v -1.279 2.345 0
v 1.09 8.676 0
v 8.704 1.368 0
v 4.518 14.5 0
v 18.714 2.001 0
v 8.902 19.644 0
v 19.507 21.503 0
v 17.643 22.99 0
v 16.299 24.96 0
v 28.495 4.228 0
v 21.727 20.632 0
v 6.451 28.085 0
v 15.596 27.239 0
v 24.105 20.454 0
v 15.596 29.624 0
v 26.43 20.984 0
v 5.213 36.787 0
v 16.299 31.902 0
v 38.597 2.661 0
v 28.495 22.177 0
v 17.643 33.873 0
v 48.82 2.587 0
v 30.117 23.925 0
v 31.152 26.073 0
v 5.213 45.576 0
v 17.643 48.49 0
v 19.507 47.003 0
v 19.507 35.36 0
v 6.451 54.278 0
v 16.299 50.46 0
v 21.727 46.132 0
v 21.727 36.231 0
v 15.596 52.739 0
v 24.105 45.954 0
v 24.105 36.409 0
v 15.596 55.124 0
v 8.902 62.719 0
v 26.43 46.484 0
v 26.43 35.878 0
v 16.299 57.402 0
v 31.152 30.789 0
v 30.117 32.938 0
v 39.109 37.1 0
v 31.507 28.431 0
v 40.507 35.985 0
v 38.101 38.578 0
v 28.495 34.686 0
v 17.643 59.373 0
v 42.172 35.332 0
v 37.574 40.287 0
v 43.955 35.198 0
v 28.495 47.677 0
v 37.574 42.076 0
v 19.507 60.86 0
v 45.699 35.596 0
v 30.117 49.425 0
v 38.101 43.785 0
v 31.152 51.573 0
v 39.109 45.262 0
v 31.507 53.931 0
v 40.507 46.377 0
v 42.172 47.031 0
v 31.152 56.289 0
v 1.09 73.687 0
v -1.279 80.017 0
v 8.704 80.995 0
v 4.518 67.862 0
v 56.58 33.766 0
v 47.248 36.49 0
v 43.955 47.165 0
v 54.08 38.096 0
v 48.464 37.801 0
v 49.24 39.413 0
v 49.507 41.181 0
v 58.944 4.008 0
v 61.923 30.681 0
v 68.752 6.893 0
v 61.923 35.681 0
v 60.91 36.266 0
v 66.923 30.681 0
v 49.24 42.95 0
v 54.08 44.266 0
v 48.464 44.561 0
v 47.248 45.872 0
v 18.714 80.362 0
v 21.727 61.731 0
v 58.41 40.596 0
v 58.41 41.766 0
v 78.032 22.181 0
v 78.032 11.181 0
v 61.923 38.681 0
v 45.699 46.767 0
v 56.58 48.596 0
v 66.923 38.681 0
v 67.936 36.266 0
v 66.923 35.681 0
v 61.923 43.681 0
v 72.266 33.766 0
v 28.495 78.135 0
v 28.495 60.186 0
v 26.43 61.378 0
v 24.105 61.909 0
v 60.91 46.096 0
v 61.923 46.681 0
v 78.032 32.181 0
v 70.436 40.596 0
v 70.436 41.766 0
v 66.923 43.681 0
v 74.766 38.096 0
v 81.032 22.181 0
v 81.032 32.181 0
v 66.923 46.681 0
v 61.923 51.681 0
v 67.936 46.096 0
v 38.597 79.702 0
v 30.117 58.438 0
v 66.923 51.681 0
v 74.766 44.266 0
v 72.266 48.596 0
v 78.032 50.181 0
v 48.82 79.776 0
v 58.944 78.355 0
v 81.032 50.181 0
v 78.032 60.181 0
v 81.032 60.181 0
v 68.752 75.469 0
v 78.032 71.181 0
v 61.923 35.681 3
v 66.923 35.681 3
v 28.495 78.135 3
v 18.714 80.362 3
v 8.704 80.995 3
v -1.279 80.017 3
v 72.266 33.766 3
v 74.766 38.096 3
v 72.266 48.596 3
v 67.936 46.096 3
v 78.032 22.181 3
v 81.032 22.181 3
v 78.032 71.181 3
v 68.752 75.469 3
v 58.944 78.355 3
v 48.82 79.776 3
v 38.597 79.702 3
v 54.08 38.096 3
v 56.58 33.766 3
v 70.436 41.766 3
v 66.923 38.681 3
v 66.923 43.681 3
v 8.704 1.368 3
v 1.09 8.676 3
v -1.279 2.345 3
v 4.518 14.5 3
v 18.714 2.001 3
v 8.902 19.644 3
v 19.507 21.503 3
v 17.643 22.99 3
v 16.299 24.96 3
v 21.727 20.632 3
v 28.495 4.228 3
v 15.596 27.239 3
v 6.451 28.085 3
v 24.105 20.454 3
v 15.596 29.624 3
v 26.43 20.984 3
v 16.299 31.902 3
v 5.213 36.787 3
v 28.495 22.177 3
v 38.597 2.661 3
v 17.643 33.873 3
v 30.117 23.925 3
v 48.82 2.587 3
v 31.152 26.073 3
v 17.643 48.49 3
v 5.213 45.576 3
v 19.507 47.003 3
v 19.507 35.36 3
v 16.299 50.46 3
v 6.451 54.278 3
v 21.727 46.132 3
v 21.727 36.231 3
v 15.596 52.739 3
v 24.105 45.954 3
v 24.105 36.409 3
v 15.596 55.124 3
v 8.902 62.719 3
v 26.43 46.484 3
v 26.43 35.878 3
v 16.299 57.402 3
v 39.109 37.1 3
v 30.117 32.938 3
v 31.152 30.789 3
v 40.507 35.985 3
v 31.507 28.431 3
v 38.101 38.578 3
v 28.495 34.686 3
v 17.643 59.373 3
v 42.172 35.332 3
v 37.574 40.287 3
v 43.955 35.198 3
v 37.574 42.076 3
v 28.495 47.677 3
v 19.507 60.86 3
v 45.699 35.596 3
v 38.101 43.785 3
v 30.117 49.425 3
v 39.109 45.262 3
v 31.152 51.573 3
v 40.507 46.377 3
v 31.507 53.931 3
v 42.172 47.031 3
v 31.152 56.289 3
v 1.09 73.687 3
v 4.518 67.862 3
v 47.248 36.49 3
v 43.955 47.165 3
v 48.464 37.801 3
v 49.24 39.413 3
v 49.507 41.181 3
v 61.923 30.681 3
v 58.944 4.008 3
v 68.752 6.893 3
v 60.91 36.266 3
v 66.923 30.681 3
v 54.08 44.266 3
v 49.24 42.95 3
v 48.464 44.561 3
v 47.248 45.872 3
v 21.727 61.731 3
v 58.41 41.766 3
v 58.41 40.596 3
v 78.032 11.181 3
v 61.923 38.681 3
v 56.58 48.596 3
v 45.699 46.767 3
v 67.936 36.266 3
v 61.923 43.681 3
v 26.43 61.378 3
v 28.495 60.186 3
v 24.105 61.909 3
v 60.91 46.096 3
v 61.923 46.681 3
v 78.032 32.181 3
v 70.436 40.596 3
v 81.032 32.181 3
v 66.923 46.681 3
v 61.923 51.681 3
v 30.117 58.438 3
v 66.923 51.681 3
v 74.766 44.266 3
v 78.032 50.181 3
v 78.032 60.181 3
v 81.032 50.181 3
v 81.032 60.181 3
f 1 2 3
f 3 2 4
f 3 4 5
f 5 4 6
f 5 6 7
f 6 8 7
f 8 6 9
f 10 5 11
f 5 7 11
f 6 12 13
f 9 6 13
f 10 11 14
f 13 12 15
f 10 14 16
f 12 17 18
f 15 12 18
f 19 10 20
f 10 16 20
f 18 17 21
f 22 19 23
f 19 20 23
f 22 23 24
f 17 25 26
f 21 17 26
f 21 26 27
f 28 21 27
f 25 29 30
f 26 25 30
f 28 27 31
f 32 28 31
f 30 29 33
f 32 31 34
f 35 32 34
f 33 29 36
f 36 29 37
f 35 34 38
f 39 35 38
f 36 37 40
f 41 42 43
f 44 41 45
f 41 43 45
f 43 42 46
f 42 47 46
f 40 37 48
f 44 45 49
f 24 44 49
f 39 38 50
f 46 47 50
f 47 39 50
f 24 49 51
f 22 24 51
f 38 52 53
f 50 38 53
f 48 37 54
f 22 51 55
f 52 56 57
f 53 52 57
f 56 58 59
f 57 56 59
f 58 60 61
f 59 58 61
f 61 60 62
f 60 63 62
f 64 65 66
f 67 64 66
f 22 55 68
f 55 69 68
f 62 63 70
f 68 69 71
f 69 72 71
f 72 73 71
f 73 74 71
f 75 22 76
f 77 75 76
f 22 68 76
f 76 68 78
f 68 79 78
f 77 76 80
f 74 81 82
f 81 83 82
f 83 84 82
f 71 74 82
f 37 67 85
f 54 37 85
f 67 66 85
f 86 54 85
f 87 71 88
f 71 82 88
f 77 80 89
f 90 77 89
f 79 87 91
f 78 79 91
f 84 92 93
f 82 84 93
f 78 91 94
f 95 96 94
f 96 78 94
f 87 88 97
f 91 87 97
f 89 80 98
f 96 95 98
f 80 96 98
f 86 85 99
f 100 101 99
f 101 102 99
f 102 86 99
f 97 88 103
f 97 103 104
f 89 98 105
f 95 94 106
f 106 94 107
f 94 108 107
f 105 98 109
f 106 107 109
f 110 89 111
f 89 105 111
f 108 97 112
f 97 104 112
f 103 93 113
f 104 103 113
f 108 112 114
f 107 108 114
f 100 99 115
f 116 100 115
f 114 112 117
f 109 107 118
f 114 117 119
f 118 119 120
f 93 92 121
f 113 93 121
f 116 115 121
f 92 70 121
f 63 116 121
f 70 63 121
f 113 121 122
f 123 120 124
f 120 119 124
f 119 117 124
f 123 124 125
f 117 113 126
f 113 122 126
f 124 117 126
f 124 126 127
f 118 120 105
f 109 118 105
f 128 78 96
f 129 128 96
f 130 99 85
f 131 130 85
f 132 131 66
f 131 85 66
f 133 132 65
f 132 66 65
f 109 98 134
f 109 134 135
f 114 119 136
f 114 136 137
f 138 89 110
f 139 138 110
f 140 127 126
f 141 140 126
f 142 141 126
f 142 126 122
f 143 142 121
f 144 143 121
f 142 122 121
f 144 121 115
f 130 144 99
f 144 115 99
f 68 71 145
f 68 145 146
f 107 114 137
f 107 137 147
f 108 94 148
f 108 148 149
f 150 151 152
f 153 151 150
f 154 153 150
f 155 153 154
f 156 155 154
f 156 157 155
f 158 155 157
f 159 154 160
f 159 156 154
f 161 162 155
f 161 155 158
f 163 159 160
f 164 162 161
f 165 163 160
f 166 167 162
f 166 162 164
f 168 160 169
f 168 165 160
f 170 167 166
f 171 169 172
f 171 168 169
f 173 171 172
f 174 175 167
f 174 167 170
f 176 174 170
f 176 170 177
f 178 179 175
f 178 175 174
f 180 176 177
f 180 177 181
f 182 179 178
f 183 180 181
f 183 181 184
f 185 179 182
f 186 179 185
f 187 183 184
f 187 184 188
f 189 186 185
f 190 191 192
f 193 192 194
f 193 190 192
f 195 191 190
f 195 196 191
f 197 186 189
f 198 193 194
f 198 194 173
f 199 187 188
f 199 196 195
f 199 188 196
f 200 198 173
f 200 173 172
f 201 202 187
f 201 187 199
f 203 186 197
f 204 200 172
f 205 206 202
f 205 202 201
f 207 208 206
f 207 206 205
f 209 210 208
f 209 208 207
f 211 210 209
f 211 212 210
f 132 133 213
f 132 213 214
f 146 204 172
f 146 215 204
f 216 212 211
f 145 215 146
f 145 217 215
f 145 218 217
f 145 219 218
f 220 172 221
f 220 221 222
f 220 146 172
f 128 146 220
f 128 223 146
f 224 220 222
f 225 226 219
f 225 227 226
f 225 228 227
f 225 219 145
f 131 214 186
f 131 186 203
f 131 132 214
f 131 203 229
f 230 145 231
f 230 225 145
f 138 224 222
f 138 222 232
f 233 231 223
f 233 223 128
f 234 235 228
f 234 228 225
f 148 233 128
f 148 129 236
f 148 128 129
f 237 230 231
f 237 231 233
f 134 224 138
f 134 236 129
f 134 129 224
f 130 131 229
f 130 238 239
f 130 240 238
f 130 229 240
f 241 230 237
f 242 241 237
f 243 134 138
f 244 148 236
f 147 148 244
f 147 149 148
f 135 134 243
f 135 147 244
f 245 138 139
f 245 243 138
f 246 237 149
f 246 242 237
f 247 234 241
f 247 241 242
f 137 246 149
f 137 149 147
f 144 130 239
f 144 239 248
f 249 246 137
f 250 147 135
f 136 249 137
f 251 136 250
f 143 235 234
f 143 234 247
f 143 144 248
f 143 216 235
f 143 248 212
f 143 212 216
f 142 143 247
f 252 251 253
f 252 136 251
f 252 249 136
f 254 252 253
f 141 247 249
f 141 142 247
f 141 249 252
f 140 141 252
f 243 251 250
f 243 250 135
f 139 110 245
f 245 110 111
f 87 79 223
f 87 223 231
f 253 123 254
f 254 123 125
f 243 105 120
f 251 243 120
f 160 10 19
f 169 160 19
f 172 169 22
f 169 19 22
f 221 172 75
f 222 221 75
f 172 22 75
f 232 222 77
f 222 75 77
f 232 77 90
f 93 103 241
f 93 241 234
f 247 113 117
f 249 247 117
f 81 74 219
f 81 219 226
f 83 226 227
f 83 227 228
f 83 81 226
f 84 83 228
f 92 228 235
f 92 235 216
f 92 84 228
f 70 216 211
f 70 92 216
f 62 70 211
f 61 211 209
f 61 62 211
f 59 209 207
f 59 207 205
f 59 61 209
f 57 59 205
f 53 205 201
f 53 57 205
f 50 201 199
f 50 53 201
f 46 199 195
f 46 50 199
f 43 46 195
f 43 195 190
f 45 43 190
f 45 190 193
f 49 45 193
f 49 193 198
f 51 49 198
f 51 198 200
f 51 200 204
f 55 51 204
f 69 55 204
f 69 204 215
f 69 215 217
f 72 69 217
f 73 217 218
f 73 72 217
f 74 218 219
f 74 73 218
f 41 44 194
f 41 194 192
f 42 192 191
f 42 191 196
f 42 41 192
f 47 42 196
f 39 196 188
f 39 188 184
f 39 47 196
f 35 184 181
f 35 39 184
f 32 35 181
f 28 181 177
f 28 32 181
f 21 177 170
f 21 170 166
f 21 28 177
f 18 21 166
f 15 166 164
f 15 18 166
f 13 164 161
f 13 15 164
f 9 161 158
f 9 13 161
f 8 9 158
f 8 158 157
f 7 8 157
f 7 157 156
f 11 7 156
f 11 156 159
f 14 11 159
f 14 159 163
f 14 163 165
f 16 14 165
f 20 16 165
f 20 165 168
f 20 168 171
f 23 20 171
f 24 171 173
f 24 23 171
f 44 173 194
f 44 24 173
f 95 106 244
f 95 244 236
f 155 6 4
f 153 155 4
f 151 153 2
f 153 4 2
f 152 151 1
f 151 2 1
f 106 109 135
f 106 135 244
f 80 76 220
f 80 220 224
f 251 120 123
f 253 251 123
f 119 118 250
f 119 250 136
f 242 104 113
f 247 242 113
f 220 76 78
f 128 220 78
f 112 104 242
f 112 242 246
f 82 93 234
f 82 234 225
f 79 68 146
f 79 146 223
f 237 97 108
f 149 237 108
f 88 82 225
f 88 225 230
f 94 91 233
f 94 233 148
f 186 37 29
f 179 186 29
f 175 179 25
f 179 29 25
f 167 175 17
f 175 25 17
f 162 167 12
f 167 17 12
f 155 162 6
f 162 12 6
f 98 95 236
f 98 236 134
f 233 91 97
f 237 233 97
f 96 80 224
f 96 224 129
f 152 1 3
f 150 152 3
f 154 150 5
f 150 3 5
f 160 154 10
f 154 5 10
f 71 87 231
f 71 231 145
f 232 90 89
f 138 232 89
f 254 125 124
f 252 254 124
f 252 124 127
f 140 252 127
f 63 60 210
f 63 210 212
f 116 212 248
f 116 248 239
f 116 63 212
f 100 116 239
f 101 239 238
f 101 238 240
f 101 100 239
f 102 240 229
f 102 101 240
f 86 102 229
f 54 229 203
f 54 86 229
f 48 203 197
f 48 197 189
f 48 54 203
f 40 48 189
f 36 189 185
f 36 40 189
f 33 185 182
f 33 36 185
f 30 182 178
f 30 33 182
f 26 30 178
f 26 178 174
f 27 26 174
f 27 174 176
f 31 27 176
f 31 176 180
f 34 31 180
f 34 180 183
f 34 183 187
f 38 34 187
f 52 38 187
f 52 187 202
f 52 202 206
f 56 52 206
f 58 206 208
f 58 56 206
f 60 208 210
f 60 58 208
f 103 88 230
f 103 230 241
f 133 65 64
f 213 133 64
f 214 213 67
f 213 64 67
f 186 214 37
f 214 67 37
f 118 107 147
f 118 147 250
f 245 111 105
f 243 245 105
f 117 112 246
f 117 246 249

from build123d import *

# Parameters (mm, degrees)
SKETCH2_R           = 8
SKETCH2_R_2         = 6
SKETCH2_W           = 5
SKETCH2_H           = 5
BOSS_EXTRUDE1_DEPTH = 3


with BuildPart() as part:
    # Sketch2 → Boss-Extrude1 (new body)
    with BuildSketch(Plane.XY):
        with BuildLine():
            Line((81.032103119, 50.181312), (81.032103119, 60.181312))
            Line((81.032103119, 60.181312), (78.032103119, 60.181312))
            Line((78.032103119, 60.181312), (78.032103119, 71.181312))
            ThreePointArc((78.032103119, 71.181312), (53.908058205, 79.251221529), (28.494548306, 78.134755037))
            ThreePointArc((28.494548306, 78.134755037), (13.721692274, 80.8793749), (-1.279201176, 80.017163065))
            ThreePointArc((-1.279201176, 80.017163065), (2.677054283, 70.700200378), (8.902417187, 62.718809041))
            ThreePointArc((8.902417187, 62.718809041), (5.05730693, 41.181312), (8.902417187, 19.643814959))
            ThreePointArc((8.902417187, 19.643814959), (2.677054283, 11.662423622), (-1.279201176, 2.345460935))
            ThreePointArc((-1.279201176, 2.345460935), (13.721692274, 1.4832491), (28.494548306, 4.227868963))
            ThreePointArc((28.494548306, 4.227868963), (53.908058205, 3.111402471), (78.032103119, 11.181312))
            Line((78.032103119, 11.181312), (78.032103119, 22.181312))
            Line((78.032103119, 22.181312), (81.032103119, 22.181312))
            Line((81.032103119, 22.181312), (81.032103119, 32.181312))
            Line((81.032103119, 32.181312), (78.032103119, 32.181312))
            Line((78.032103119, 32.181312), (78.032103119, 50.181312))
            Line((78.032103119, 50.181312), (81.032103119, 50.181312))
        make_face()
        with Locations((23.507028058, 53.931312)):
            Circle(SKETCH2_R, mode=Mode.SUBTRACT)
        with Locations((43.507028058, 41.181312)):
            Circle(SKETCH2_R_2, mode=Mode.SUBTRACT)
        with Locations((23.507028058, 28.431312)):
            Circle(SKETCH2_R, mode=Mode.SUBTRACT)
        with Locations((64.423022125, 41.181312)):
            Rectangle(SKETCH2_W, SKETCH2_H, mode=Mode.SUBTRACT)
        with Locations((64.423022125, 33.181312)):
            Rectangle(SKETCH2_W, SKETCH2_H, mode=Mode.SUBTRACT)
        Polygon((72.266288865, 48.59637551), (67.936161846, 46.09637551), (70.436161846, 41.766248491), (74.766288865, 44.266248491), align=None, mode=Mode.SUBTRACT)
        Polygon((67.936161846, 36.266248491), (72.266288865, 33.766248491), (74.766288865, 38.09637551), (70.436161846, 40.596375509), align=None, mode=Mode.SUBTRACT)
        with Locations((64.423022125, 49.181312)):
            Rectangle(SKETCH2_W, SKETCH2_H, mode=Mode.SUBTRACT)
        Polygon((56.579755385, 33.766248491), (60.909882404, 36.266248491), (58.409882404, 40.59637551), (54.079755385, 38.09637551), align=None, mode=Mode.SUBTRACT)
        Polygon((60.909882404, 46.09637551), (56.579755385, 48.596375509), (54.079755385, 44.266248491), (58.409882404, 41.766248491), align=None, mode=Mode.SUBTRACT)
    extrude(amount=BOSS_EXTRUDE1_DEPTH)


solid = part.part
